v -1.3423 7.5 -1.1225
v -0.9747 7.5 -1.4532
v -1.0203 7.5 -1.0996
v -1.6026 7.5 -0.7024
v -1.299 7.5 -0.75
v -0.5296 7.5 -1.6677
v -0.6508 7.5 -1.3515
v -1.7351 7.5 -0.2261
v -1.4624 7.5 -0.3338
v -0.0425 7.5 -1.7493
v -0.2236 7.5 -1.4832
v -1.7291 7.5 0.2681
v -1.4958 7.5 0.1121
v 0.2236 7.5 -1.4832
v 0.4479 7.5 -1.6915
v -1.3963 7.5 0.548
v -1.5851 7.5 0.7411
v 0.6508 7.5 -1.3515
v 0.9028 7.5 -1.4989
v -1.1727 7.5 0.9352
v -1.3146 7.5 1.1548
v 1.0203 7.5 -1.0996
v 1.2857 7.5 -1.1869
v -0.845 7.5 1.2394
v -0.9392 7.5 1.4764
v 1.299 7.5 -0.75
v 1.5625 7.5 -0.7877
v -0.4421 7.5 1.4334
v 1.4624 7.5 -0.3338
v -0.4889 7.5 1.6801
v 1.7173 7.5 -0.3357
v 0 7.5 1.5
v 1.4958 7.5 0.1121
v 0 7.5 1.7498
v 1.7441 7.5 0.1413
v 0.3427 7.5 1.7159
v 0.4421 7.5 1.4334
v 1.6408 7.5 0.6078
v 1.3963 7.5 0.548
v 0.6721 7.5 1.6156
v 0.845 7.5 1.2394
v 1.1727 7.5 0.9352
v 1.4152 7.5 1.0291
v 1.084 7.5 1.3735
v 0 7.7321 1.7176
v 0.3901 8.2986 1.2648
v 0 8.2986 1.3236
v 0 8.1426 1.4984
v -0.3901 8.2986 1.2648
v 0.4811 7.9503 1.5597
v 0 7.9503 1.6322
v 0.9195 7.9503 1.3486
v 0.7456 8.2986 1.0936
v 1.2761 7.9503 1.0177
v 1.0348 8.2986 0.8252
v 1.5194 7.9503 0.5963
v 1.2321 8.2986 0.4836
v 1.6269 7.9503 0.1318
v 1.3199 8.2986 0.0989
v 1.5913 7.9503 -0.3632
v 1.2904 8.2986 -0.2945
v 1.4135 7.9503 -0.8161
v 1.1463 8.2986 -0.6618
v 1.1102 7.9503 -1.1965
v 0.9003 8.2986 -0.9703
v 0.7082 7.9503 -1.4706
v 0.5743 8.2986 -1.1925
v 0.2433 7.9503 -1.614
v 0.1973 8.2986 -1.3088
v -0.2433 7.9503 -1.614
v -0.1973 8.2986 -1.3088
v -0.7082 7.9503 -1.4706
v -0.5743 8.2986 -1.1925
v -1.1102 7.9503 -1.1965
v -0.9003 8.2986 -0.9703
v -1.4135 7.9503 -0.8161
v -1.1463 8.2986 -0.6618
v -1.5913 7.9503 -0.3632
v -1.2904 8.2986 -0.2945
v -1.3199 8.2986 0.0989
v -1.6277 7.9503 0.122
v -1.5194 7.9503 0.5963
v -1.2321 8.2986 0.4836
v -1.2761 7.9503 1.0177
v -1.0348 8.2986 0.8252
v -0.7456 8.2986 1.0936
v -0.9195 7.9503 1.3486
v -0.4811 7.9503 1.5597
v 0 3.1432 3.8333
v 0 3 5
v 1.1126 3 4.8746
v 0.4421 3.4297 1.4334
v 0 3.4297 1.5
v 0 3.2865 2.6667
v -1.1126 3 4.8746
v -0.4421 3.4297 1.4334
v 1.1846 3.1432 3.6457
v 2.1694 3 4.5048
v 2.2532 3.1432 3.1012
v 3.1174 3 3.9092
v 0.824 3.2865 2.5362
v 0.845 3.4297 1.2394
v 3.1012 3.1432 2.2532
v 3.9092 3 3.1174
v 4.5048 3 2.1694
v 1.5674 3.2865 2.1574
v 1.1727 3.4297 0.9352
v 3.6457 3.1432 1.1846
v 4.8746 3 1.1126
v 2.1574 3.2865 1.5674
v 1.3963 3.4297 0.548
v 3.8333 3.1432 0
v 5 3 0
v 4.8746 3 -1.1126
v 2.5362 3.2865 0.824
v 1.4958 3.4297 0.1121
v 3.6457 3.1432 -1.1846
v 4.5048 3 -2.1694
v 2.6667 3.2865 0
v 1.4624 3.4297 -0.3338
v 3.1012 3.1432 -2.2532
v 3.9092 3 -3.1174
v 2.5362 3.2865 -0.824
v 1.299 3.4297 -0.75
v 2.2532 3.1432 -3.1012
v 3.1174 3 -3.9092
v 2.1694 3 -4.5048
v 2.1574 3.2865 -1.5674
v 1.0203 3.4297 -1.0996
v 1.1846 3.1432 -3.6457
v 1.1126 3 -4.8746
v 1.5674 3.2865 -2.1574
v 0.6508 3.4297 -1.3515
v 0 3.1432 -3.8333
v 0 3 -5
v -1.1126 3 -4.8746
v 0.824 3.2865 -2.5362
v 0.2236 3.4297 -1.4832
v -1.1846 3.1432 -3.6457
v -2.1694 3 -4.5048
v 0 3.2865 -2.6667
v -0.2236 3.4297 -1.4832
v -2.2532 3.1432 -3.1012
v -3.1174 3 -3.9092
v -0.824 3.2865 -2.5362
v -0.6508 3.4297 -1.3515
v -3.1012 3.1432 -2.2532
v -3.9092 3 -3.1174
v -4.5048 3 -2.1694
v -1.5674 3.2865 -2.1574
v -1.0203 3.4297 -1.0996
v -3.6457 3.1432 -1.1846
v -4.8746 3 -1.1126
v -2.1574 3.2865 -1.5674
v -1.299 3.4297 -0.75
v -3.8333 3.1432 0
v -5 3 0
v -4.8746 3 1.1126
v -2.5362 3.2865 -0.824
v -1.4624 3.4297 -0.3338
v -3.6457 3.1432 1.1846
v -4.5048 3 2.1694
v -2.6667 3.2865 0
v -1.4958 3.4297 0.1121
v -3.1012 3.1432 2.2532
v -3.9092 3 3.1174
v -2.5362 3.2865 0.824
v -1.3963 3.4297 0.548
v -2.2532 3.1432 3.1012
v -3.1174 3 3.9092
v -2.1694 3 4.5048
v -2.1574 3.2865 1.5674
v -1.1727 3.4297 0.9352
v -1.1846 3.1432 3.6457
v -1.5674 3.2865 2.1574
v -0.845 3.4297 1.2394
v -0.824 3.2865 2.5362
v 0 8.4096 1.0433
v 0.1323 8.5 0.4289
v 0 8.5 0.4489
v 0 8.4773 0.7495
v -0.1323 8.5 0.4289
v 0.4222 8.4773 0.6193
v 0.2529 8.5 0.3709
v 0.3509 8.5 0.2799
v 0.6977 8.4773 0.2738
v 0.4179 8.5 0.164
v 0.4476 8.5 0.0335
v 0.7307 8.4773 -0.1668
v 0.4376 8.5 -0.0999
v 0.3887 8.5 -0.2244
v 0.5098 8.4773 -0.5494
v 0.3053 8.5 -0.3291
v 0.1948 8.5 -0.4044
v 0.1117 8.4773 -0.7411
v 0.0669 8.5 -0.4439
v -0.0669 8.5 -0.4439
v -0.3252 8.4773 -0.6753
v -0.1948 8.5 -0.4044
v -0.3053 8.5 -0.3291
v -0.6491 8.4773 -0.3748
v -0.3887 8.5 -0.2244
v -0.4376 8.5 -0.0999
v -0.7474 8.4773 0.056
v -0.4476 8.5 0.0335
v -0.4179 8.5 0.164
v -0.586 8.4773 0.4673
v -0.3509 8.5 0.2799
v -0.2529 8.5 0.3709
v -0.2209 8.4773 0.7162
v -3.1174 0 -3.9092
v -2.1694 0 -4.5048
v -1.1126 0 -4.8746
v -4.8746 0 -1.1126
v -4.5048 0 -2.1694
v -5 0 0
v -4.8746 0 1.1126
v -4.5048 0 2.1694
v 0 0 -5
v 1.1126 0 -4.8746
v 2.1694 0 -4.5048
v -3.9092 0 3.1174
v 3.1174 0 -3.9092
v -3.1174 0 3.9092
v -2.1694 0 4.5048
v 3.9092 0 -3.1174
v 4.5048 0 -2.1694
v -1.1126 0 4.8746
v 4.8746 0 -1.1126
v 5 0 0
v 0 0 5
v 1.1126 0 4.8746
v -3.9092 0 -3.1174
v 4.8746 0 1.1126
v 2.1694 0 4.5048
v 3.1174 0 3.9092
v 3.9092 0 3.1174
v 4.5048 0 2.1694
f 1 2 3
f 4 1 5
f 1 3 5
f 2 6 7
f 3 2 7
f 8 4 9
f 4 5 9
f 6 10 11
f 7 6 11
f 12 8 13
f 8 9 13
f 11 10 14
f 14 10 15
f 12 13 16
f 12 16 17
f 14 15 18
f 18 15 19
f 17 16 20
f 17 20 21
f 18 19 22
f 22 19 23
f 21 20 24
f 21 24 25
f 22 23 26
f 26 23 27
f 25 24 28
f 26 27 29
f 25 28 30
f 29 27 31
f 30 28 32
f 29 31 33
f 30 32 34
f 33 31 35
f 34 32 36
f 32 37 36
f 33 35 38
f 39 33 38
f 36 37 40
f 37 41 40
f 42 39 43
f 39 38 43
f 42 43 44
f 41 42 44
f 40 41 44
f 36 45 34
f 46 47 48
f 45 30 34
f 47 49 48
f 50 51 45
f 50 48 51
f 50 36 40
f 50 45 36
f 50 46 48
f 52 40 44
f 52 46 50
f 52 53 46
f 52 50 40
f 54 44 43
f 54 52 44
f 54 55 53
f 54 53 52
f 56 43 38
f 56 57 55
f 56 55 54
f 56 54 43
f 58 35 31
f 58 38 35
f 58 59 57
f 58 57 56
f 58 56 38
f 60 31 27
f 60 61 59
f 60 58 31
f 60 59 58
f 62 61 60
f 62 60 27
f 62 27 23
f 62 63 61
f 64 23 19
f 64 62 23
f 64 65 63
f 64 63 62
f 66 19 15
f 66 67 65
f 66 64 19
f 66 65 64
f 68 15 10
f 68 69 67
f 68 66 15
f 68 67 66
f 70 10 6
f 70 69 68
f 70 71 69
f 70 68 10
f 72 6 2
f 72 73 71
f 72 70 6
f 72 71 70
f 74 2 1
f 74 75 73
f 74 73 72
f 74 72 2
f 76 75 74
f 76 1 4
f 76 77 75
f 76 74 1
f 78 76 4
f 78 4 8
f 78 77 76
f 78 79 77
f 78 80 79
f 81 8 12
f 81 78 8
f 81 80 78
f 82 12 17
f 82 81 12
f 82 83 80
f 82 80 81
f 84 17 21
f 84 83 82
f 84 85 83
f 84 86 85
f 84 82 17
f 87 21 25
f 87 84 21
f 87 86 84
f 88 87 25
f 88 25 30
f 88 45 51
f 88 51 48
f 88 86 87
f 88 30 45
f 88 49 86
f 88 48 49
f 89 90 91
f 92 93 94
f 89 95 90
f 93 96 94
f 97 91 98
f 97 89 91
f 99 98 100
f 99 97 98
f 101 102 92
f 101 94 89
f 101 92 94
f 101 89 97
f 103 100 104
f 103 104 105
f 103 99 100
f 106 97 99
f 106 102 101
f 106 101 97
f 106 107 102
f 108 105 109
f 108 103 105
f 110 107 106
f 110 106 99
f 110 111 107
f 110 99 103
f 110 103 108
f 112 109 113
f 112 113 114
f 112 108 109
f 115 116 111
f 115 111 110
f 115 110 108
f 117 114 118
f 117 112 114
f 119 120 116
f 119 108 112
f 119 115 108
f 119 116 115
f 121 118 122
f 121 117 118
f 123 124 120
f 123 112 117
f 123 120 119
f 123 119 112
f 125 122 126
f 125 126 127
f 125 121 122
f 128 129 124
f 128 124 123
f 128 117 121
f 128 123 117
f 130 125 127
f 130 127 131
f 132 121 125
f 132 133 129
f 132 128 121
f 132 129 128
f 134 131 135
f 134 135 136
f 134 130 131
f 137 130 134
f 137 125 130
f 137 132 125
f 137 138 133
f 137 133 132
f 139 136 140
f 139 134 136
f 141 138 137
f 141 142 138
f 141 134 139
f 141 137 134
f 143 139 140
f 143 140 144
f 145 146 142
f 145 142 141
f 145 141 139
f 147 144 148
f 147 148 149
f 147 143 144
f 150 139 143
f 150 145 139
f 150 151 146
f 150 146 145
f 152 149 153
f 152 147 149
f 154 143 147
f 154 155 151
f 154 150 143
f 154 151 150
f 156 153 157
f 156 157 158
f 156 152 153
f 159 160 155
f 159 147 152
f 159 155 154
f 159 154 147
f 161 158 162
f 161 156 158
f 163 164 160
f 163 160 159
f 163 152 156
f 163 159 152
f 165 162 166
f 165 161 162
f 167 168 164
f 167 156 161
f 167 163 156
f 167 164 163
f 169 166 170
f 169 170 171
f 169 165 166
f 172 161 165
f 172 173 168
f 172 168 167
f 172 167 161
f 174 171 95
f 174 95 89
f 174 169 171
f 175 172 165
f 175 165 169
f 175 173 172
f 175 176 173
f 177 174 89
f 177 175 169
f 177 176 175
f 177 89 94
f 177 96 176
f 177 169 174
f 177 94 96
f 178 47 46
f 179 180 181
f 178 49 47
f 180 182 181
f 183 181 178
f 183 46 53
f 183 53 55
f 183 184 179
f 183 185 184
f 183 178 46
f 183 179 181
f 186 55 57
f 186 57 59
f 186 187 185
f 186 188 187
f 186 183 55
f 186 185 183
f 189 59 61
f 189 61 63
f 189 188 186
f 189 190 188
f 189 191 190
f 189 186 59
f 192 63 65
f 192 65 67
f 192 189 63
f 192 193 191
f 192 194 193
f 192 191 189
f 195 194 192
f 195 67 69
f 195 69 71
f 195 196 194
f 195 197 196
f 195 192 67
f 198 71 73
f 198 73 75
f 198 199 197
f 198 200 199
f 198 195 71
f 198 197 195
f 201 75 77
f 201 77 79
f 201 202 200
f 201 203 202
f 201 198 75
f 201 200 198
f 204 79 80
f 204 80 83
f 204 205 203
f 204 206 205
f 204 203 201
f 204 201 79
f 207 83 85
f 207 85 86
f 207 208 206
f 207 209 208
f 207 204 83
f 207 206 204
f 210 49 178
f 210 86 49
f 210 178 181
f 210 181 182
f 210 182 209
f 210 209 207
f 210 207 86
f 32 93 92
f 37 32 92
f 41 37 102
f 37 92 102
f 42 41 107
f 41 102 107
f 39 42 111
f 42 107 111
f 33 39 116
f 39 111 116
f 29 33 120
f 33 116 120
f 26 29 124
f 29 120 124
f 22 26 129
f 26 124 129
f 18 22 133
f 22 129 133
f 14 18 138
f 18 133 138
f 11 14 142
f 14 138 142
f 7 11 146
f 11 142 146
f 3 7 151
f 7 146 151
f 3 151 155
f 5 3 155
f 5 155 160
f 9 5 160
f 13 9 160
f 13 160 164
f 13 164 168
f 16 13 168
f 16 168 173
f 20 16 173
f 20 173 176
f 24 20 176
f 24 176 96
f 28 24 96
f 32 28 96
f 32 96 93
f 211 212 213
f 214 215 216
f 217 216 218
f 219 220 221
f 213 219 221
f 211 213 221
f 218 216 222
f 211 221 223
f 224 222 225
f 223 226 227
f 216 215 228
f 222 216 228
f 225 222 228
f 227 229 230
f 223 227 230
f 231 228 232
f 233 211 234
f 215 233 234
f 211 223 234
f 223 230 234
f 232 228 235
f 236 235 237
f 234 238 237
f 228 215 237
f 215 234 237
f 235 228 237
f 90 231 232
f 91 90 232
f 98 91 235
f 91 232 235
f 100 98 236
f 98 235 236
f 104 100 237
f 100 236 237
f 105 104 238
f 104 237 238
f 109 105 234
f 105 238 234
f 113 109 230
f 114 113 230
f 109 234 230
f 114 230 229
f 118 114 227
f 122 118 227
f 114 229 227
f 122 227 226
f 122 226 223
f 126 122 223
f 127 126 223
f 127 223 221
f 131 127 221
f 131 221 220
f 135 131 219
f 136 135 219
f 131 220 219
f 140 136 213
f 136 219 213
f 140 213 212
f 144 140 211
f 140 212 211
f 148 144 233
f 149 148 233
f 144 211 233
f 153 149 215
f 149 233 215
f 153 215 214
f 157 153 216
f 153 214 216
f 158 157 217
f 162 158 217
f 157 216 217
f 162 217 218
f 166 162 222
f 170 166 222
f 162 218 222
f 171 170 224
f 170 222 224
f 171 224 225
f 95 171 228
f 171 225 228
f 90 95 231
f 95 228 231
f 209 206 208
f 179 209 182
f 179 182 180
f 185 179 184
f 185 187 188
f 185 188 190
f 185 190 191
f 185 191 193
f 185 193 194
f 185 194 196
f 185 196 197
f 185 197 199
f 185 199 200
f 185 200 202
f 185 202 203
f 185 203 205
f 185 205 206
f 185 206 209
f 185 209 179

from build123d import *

# Parameters (mm, degrees)
ESBO_O2_R                     = 5
RESSALTO_EXTRUS_O2_DEPTH      = 3.5
CHANFRO1_SIZE                 = 0.5
CHANFRO1_SIZE2                = 4.072173214
RESSALTO_EXTRUS_O3_DEPTH      = 4
RESSALTO_EXTRUS_O3_DEPTH_BACK = 1
ESBO_O3_R                     = 1.5
ESBO_O4_R                     = 1.75
RESSALTO_EXTRUS_O4_DEPTH      = 1
CHANFRO2_SIZE                 = 0.5
CHANFRO2_SIZE2                = 0.714074003
FILETE2_R                     = 1
FILETE3_R                     = 2


with BuildPart() as part:
    # Esboço2 → Ressalto-extrusão2 (new body)
    with BuildSketch(Plane(origin=(0, 0, 0), x_dir=(1, 0, 0), z_dir=(0, 1, 0))):
        with Locations(Location((0, 0, 0), (0, 0, 270))):
            Circle(ESBO_O2_R)
    extrude(amount=RESSALTO_EXTRUS_O2_DEPTH)

    # Chanfro1
    chanfro1_edges = [part.edges().sort_by_distance(p)[0] for p in [
        (0, 3.5, -5),
    ]]
    chanfro1_side = [part.faces().sort_by_distance(p)[0] for p in [
        (0, 1.75, -5),
    ]]
    chamfer(chanfro1_edges, length=CHANFRO1_SIZE, length2=CHANFRO1_SIZE2, reference=chanfro1_side[0])

    # Esboço3 → Ressalto-extrusão3 (add, two sides: drawn at the far end of the back side and taken through both)
    with BuildSketch(Plane(origin=(0, 3.5, 0), x_dir=(1, 0, 0), z_dir=(0, 1, 0)).offset(-RESSALTO_EXTRUS_O3_DEPTH_BACK)):
        with Locations(Location((0, 0, 0), (0, 0, 270))):
            Circle(ESBO_O3_R)
    extrude(amount=RESSALTO_EXTRUS_O3_DEPTH + RESSALTO_EXTRUS_O3_DEPTH_BACK)

    # Esboço4 → Ressalto-extrusão4 (add)
    with BuildSketch(Plane(origin=(0, 7.5, 0), x_dir=(1, 0, 0), z_dir=(0, 1, 0))):
        with Locations(Location((0, 0, 0), (0, 0, 270))):
            Circle(ESBO_O4_R)
    extrude(amount=RESSALTO_EXTRUS_O4_DEPTH)

    # Chanfro2
    chanfro2_edges = [part.edges().sort_by_distance(p)[0] for p in [
        (0, 8.5, -1.75),
    ]]
    chanfro2_side = [part.faces().sort_by_distance(p)[0] for p in [
        (0, 8, -1.75),
    ]]
    chamfer(chanfro2_edges, length=CHANFRO2_SIZE, length2=CHANFRO2_SIZE2, reference=chanfro2_side[0])

    # Filete2
    # the kernel refuses this fillet: 1 mm, written as the material it takes off along each edge
    with BuildSketch(Plane(origin=(0, 8, 0), x_dir=(0, 0, 1), z_dir=(-1, 0, 0))) as filete2_piece_1:
        with BuildLine():
            CenterArc((1.75 - FILETE2_R, -FILETE2_R * 0.520567050552), FILETE2_R, 0, 55)
            Line((1.75 - FILETE2_R * 0.426423563649, FILETE2_R * 0.298584993737), (1.75, 0))
            Line((1.75, 0), (1.75, -FILETE2_R * 0.520567050552))
        make_face()
    revolve(axis=Axis((0, 8, 0), (0, 1, 0)), mode=Mode.SUBTRACT)

    # Filete3
    # the kernel refuses this fillet: 2 mm, written as the material it takes off along each edge
    with BuildSketch(Plane(origin=(0, 8.5, 0), x_dir=(0, 0, 1), z_dir=(-1, 0, 0))) as filete3_piece_1:
        with BuildLine():
            CenterArc((0.448881049, -2), FILETE3_R, 64.065224384, 25.934775616)
            Line((0.448881049, 0), (0.448881049, 0.04))
            Line((0.448881049, 0.04), (1.035925997, 0.04))
            Line((1.035925997, 0.04), (1.058869054, 0.032766082))
            ThreePointArc((1.058869054, 0.032766082), (1.202694274, -0.067941421), (1.341070344, -0.165443306))
            Line((1.341070344, -0.165443306), (1.323576436, -0.201415006))
        make_face()
    revolve(axis=Axis((0, 8.5, 0), (0, 1, 0)), mode=Mode.SUBTRACT)


solid = part.part
